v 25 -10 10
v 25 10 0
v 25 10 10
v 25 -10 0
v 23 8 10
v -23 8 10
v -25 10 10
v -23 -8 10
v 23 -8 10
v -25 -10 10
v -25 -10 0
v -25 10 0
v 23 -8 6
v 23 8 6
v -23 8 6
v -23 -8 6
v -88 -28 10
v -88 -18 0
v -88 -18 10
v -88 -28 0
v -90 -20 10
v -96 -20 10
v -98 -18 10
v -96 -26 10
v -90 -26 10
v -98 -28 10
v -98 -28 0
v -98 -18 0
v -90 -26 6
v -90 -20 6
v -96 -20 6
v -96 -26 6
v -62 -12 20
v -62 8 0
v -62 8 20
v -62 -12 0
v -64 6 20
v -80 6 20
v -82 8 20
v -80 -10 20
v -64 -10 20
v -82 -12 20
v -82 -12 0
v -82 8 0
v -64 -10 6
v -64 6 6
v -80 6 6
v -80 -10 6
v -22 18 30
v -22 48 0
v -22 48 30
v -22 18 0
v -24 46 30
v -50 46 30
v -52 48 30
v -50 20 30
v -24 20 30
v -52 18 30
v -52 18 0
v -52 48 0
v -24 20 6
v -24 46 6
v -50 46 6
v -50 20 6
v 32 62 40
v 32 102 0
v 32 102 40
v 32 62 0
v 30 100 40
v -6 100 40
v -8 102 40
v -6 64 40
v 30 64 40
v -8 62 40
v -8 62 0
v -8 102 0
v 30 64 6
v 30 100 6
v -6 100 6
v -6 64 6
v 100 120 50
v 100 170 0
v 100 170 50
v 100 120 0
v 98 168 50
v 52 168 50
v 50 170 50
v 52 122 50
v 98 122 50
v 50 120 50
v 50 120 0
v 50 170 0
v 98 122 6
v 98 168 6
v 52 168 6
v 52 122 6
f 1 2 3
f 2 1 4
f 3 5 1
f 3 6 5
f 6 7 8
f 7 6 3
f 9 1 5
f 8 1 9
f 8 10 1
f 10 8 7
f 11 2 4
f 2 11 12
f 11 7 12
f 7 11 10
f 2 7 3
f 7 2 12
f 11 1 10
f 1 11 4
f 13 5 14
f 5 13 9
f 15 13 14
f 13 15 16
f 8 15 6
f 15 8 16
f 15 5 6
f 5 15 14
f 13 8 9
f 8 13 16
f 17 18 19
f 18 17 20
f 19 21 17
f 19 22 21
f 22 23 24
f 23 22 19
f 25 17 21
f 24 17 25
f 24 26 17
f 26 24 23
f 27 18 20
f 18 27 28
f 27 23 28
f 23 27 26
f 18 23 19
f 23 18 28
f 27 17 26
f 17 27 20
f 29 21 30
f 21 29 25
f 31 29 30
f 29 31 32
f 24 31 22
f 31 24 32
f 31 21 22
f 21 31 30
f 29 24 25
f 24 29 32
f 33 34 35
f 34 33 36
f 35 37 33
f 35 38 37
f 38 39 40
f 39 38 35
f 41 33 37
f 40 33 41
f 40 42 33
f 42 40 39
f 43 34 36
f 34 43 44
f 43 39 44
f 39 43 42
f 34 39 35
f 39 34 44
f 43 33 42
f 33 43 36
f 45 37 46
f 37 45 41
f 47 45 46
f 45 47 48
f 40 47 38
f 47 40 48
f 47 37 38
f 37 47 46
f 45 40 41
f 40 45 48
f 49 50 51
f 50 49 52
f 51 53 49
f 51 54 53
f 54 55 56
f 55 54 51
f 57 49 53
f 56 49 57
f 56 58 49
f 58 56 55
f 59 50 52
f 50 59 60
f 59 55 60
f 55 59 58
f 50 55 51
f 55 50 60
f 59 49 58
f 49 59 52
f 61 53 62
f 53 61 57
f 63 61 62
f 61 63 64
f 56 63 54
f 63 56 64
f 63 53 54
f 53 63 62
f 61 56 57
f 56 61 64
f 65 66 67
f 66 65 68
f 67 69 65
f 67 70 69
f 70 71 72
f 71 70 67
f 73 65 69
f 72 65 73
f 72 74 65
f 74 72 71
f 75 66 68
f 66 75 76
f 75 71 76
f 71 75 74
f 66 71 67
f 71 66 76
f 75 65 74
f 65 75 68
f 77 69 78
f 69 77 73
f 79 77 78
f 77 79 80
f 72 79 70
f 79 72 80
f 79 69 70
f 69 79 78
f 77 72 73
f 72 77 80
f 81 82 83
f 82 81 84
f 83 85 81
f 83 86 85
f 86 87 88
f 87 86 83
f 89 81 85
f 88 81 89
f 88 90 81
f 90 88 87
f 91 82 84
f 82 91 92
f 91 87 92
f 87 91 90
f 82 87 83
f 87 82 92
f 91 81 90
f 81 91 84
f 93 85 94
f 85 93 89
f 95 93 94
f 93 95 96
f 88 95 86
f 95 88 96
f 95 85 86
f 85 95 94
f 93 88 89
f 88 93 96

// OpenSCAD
/*

Sage Ridge Robotics OpenSCAD file.
Christopher von Nagy, July 2014.

Example 09 box_of_many_sizes() module.

*/


// One could quickly build a model of a Roman city using
// modules. Of course, it would be nice to be able to size
// the construct with some simple parameters.
// Let's go back to the match_box() module and make a
// few changes to the module. We'll call the module
// box_of_many_sizes(). See below the module section below.

translate([0,0,0])
box_of_many_sizes(50,20,10);

// We can automate box making with a nested for() loop
base_size_unit = 10;

translate([-100,-30,0])
for (i = [1 : 5])
{

    assign(
        translation_distance =
            (0.7 *(i * i * base_size_unit)),
        width = i * base_size_unit,
        length = i * base_size_unit,
        height = i * base_size_unit
    )
    {
        translate([translation_distance,translation_distance,0])
        box_of_many_sizes(
            width,
            length,
            height
        );
    }
}

/*

Define modules

We define larger modules used in code examples above in this section.

These modules include the

   acme_widget22() module
   match_box() module
   box_of_many_sizes()


*/


// The acme_widget_22() module
module acme_widget_22()
{
i = -10;
difference()
{

    union()
    {
        cylinder(r=2, h=20, center=true);
        translate([0,0,8]) cylinder(r=4,h=2);
        hull ()
        {
            translate([0,0,i]) cylinder(r=2,h=2);
            translate([10,0,i]) cylinder(r=2,h=2);
            translate([5,10,i]) cylinder(r=2,h=2);
        }
    }

# cylinder(r=1, h=22, center=true);
# translate([0,0,8]) cylinder(r=2, h=2);
# translate([10,0,i-1]) cylinder(r=1,h=4);
# translate([5,10,i-1]) cylinder(r=1,h=4);

}
}


// The match_box module
module match_box()
{
difference()
{
    cube([40,20,10], center=true);
    translate([0,0,1]) cube([38,18,10], center=true);
}
translate([-60,100,15])
union()
{
    cube([40,20,2], center=true);
    translate(0,0,0) cube([38,18,4], center=true);
}
}


// The box_of_many_sizes() module
module box_of_many_sizes(

        // sensible default values
        width = 60,
        length = 100,
        height = 40,

    )
{

wall_thickness = 2;

translate([0,0,height/2])
difference()
{
    cube([width,length,height], center=true);
    translate([0,0,4]) cube([
                                width-(2 * wall_thickness),
                                length-(2 * wall_thickness),
                                height-(2 * wall_thickness)],
                            center=true);

}
}


/*

License code:

Creative Commons Atribution 4.0

Attribution — You must give appropriate credit, provide a link to the license, and indicate if changes were made. You may do so in any reasonable manner, but not in any way that suggests the licensor endorses you or your use.

No additional restrictions — You may not apply legal terms or technological measures that legally restrict others from doing anything the license permits.


*/
